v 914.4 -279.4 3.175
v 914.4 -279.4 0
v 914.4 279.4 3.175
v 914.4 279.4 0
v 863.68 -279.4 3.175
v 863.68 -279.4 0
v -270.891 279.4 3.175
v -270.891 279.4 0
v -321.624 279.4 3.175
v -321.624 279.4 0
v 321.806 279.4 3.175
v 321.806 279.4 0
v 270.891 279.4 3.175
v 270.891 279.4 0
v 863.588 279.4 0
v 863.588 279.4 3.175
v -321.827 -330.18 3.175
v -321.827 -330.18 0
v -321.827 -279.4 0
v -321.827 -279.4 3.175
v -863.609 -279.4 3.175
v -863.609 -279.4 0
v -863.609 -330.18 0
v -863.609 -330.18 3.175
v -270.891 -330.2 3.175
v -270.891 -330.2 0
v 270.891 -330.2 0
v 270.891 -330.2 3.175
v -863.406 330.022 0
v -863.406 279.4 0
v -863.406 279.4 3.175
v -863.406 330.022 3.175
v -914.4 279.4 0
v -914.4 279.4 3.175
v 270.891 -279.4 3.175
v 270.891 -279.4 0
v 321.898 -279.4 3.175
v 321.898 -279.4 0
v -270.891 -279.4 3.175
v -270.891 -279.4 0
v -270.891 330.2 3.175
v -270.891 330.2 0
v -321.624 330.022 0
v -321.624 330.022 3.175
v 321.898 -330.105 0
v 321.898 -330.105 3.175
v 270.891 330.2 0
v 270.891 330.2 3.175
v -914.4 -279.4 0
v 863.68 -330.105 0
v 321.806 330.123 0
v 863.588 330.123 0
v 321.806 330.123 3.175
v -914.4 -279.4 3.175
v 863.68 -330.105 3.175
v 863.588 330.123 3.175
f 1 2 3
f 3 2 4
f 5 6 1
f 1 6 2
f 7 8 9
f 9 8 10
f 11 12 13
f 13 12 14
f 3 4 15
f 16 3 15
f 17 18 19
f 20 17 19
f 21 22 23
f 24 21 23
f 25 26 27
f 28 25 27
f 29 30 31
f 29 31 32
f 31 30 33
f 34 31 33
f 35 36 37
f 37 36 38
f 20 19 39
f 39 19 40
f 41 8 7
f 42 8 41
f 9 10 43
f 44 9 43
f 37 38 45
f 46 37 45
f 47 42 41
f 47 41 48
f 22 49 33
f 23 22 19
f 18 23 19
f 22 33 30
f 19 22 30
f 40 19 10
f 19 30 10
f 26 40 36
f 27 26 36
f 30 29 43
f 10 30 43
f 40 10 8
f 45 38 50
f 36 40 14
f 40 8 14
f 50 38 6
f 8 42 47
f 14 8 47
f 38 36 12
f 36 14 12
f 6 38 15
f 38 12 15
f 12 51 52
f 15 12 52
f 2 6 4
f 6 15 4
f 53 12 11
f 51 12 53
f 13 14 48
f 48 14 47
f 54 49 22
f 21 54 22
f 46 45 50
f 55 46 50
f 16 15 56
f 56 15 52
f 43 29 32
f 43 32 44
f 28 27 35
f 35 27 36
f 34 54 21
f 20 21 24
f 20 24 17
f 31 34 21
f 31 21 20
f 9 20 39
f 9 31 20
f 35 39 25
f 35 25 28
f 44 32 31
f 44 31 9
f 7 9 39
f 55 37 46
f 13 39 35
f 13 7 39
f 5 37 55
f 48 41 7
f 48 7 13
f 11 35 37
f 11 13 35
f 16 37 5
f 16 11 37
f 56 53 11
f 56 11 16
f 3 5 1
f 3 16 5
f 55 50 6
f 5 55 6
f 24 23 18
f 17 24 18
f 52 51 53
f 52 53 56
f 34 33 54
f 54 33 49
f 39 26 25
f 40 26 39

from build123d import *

# Parameters (mm, degrees)
F0_W     = 541.782
F0_H     = 50.8
F0_W_2   = 541.7734120522
F0_H_2   = 0.0195167541
F0_W_3   = 541.7015288506
F0_H_3   = 0.0952444553
F0_W_4   = 0.0085879478
F0_W_5   = 0.0804711494
F0_H_4   = 50.6215176582
F0_H_5   = 0.1784823418
F0_H_6   = 0.077184248
F0_H_7   = 50.722815752
F1_DEPTH = 3.175


with BuildPart() as f1:
    # F0 (on Top) → F1 (new body)
    with BuildSketch(Plane.XY):
        Polygon((-321.8265879478, -279.4), (-270.891, -279.4), (270.891, -279.4), (321.8984711494, -279.4), (321.8984711494, -279.3047555447), (863.6, -279.3047555447), (863.6, 279.4), (863.5880243454, 279.4), (863.5880243454, 279.322815752), (321.8060243454, 279.322815752), (321.8060243454, 279.4), (270.891, 279.4), (-270.891, 279.4), (-321.623693737, 279.4), (-321.623693737, 279.2215176582), (-863.405693737, 279.2215176582), (-863.405693737, 279.4), (-863.6, 279.4), (-863.6, -279.3804832459), (-321.8265879478, -279.3804832459), align=None)
        with Locations((0, -304.8)):
            Rectangle(F0_W, F0_H)
        Polygon((-321.8265879478, -330.1804832459), (-321.8265879478, -279.4), (-863.6, -279.4), (-863.6085879478, -279.4), (-863.6085879478, -330.1804832459), align=None)
        with Locations((-592.7132939739, -279.3902416229)):
            Rectangle(F0_W_2, F0_H_2)
        with Locations((592.7492355747, -279.3523777723)):
            Rectangle(F0_W_3, F0_H_3)
        Polygon((863.6, -279.4), (321.8984711494, -279.4), (321.8984711494, -330.1047555447), (863.6804711494, -330.1047555447), (863.6804711494, -279.4), align=None)
        with Locations((-863.6042939739, -279.3902416229)):
            Rectangle(F0_W_4, F0_H_2)
        with Locations((863.6402355747, -279.3523777723)):
            Rectangle(F0_W_5, F0_H_3)
        Polygon((-863.6085879478, -279.3804832459), (-863.6, -279.3804832459), (-863.6, 279.4), (-914.4, 279.4), (-914.4, -279.4), (-863.6085879478, -279.4), align=None)
        Polygon((863.6, 279.4), (863.6, -279.3047555447), (863.6804711494, -279.3047555447), (863.6804711494, -279.4), (914.4, -279.4), (914.4, 279.4), align=None)
        with Locations((-592.514693737, 304.7107588291)):
            Rectangle(F0_W, F0_H_4)
        with Locations((-592.514693737, 279.3107588291)):
            Rectangle(F0_W, F0_H_5)
        with Locations((592.6970243454, 279.361407876)):
            Rectangle(F0_W, F0_H_6)
        with Locations((592.6970243454, 304.761407876)):
            Rectangle(F0_W, F0_H_7)
        with Locations((0, 304.8)):
            Rectangle(F0_W, F0_H)
    extrude(amount=F1_DEPTH)


solid = f1.part
